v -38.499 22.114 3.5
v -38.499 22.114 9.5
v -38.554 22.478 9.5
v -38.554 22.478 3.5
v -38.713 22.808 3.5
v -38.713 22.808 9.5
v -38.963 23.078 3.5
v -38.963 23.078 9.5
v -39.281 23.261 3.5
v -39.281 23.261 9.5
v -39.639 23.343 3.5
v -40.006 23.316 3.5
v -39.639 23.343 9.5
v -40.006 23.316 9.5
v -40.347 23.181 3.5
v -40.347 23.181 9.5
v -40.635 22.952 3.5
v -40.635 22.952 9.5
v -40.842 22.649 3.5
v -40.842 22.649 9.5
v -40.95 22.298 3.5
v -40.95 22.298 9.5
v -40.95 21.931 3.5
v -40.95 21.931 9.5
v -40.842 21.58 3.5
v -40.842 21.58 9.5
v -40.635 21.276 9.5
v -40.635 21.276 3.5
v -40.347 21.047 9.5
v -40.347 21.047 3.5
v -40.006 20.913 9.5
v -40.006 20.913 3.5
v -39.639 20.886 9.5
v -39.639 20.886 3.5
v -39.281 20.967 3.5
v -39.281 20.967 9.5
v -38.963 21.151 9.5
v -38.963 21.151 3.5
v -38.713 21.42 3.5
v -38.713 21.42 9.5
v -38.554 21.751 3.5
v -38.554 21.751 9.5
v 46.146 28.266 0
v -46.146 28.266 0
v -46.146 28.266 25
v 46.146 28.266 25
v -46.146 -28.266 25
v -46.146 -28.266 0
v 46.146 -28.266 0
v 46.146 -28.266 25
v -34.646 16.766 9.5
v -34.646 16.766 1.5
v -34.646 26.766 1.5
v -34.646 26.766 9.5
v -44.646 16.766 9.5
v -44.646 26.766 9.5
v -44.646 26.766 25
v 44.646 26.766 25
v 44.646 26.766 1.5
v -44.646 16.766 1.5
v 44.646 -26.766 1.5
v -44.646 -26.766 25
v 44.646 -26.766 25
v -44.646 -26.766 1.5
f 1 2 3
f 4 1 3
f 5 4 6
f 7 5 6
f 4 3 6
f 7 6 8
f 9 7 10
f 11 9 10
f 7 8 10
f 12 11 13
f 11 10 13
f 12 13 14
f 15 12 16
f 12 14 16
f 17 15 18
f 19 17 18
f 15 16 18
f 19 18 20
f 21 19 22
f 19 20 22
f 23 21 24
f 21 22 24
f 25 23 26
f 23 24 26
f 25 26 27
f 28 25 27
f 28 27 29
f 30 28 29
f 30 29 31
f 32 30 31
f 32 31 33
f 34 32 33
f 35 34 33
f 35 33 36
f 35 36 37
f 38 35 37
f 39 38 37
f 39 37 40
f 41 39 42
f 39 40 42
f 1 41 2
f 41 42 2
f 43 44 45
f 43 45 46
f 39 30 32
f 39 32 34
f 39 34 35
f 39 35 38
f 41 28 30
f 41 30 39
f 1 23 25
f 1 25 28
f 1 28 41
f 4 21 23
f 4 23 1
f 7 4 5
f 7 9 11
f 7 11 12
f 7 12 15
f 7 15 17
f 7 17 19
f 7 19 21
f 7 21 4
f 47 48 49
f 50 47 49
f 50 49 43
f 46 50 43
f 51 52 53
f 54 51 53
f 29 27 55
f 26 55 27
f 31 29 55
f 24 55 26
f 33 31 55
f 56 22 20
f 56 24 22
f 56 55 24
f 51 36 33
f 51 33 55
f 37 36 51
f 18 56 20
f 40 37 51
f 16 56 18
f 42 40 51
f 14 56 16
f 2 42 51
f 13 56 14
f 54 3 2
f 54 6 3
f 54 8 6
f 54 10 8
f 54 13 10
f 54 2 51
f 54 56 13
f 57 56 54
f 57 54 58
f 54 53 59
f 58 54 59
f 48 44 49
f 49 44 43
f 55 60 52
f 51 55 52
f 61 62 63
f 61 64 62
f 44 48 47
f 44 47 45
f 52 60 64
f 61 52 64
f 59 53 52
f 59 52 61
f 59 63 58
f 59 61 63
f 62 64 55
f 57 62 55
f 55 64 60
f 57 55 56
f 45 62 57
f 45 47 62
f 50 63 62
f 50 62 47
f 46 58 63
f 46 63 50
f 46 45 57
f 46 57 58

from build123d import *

# Parameters (mm, degrees)
F0_W     = 92.291318
F0_H     = 56.53172
F1_DEPTH = 25
F2_T     = -1.5
F3_W     = 10
F3_H     = 10
F4_DEPTH = 8
F5_R     = 1.232119
F6_DEPTH = 6


with BuildPart() as f1:
    # F0 (on Top) → F1 (new body)
    with BuildSketch(Plane.XY):
        Rectangle(F0_W, F0_H)
    extrude(amount=F1_DEPTH)

    # F2
    f2_openings = [f1.faces().sort_by_distance(p)[0] for p in [
        (0, 0, 25),
    ]]
    offset(amount=F2_T, openings=f2_openings)

    # F3 (on face) → F4 (join)
    with BuildSketch(Plane.XY.offset(1.5)):
        with Locations((-39.645659, 21.76586)):
            Rectangle(F3_W, F3_H)
    extrude(amount=F4_DEPTH)

    # F5 (on face) → F6 (cut)
    with BuildSketch(Plane.XY.offset(9.5)):
        with Locations((-39.731406, 22.114344)):
            Circle(F5_R)
    extrude(amount=-F6_DEPTH, mode=Mode.SUBTRACT)


solid = f1.part
